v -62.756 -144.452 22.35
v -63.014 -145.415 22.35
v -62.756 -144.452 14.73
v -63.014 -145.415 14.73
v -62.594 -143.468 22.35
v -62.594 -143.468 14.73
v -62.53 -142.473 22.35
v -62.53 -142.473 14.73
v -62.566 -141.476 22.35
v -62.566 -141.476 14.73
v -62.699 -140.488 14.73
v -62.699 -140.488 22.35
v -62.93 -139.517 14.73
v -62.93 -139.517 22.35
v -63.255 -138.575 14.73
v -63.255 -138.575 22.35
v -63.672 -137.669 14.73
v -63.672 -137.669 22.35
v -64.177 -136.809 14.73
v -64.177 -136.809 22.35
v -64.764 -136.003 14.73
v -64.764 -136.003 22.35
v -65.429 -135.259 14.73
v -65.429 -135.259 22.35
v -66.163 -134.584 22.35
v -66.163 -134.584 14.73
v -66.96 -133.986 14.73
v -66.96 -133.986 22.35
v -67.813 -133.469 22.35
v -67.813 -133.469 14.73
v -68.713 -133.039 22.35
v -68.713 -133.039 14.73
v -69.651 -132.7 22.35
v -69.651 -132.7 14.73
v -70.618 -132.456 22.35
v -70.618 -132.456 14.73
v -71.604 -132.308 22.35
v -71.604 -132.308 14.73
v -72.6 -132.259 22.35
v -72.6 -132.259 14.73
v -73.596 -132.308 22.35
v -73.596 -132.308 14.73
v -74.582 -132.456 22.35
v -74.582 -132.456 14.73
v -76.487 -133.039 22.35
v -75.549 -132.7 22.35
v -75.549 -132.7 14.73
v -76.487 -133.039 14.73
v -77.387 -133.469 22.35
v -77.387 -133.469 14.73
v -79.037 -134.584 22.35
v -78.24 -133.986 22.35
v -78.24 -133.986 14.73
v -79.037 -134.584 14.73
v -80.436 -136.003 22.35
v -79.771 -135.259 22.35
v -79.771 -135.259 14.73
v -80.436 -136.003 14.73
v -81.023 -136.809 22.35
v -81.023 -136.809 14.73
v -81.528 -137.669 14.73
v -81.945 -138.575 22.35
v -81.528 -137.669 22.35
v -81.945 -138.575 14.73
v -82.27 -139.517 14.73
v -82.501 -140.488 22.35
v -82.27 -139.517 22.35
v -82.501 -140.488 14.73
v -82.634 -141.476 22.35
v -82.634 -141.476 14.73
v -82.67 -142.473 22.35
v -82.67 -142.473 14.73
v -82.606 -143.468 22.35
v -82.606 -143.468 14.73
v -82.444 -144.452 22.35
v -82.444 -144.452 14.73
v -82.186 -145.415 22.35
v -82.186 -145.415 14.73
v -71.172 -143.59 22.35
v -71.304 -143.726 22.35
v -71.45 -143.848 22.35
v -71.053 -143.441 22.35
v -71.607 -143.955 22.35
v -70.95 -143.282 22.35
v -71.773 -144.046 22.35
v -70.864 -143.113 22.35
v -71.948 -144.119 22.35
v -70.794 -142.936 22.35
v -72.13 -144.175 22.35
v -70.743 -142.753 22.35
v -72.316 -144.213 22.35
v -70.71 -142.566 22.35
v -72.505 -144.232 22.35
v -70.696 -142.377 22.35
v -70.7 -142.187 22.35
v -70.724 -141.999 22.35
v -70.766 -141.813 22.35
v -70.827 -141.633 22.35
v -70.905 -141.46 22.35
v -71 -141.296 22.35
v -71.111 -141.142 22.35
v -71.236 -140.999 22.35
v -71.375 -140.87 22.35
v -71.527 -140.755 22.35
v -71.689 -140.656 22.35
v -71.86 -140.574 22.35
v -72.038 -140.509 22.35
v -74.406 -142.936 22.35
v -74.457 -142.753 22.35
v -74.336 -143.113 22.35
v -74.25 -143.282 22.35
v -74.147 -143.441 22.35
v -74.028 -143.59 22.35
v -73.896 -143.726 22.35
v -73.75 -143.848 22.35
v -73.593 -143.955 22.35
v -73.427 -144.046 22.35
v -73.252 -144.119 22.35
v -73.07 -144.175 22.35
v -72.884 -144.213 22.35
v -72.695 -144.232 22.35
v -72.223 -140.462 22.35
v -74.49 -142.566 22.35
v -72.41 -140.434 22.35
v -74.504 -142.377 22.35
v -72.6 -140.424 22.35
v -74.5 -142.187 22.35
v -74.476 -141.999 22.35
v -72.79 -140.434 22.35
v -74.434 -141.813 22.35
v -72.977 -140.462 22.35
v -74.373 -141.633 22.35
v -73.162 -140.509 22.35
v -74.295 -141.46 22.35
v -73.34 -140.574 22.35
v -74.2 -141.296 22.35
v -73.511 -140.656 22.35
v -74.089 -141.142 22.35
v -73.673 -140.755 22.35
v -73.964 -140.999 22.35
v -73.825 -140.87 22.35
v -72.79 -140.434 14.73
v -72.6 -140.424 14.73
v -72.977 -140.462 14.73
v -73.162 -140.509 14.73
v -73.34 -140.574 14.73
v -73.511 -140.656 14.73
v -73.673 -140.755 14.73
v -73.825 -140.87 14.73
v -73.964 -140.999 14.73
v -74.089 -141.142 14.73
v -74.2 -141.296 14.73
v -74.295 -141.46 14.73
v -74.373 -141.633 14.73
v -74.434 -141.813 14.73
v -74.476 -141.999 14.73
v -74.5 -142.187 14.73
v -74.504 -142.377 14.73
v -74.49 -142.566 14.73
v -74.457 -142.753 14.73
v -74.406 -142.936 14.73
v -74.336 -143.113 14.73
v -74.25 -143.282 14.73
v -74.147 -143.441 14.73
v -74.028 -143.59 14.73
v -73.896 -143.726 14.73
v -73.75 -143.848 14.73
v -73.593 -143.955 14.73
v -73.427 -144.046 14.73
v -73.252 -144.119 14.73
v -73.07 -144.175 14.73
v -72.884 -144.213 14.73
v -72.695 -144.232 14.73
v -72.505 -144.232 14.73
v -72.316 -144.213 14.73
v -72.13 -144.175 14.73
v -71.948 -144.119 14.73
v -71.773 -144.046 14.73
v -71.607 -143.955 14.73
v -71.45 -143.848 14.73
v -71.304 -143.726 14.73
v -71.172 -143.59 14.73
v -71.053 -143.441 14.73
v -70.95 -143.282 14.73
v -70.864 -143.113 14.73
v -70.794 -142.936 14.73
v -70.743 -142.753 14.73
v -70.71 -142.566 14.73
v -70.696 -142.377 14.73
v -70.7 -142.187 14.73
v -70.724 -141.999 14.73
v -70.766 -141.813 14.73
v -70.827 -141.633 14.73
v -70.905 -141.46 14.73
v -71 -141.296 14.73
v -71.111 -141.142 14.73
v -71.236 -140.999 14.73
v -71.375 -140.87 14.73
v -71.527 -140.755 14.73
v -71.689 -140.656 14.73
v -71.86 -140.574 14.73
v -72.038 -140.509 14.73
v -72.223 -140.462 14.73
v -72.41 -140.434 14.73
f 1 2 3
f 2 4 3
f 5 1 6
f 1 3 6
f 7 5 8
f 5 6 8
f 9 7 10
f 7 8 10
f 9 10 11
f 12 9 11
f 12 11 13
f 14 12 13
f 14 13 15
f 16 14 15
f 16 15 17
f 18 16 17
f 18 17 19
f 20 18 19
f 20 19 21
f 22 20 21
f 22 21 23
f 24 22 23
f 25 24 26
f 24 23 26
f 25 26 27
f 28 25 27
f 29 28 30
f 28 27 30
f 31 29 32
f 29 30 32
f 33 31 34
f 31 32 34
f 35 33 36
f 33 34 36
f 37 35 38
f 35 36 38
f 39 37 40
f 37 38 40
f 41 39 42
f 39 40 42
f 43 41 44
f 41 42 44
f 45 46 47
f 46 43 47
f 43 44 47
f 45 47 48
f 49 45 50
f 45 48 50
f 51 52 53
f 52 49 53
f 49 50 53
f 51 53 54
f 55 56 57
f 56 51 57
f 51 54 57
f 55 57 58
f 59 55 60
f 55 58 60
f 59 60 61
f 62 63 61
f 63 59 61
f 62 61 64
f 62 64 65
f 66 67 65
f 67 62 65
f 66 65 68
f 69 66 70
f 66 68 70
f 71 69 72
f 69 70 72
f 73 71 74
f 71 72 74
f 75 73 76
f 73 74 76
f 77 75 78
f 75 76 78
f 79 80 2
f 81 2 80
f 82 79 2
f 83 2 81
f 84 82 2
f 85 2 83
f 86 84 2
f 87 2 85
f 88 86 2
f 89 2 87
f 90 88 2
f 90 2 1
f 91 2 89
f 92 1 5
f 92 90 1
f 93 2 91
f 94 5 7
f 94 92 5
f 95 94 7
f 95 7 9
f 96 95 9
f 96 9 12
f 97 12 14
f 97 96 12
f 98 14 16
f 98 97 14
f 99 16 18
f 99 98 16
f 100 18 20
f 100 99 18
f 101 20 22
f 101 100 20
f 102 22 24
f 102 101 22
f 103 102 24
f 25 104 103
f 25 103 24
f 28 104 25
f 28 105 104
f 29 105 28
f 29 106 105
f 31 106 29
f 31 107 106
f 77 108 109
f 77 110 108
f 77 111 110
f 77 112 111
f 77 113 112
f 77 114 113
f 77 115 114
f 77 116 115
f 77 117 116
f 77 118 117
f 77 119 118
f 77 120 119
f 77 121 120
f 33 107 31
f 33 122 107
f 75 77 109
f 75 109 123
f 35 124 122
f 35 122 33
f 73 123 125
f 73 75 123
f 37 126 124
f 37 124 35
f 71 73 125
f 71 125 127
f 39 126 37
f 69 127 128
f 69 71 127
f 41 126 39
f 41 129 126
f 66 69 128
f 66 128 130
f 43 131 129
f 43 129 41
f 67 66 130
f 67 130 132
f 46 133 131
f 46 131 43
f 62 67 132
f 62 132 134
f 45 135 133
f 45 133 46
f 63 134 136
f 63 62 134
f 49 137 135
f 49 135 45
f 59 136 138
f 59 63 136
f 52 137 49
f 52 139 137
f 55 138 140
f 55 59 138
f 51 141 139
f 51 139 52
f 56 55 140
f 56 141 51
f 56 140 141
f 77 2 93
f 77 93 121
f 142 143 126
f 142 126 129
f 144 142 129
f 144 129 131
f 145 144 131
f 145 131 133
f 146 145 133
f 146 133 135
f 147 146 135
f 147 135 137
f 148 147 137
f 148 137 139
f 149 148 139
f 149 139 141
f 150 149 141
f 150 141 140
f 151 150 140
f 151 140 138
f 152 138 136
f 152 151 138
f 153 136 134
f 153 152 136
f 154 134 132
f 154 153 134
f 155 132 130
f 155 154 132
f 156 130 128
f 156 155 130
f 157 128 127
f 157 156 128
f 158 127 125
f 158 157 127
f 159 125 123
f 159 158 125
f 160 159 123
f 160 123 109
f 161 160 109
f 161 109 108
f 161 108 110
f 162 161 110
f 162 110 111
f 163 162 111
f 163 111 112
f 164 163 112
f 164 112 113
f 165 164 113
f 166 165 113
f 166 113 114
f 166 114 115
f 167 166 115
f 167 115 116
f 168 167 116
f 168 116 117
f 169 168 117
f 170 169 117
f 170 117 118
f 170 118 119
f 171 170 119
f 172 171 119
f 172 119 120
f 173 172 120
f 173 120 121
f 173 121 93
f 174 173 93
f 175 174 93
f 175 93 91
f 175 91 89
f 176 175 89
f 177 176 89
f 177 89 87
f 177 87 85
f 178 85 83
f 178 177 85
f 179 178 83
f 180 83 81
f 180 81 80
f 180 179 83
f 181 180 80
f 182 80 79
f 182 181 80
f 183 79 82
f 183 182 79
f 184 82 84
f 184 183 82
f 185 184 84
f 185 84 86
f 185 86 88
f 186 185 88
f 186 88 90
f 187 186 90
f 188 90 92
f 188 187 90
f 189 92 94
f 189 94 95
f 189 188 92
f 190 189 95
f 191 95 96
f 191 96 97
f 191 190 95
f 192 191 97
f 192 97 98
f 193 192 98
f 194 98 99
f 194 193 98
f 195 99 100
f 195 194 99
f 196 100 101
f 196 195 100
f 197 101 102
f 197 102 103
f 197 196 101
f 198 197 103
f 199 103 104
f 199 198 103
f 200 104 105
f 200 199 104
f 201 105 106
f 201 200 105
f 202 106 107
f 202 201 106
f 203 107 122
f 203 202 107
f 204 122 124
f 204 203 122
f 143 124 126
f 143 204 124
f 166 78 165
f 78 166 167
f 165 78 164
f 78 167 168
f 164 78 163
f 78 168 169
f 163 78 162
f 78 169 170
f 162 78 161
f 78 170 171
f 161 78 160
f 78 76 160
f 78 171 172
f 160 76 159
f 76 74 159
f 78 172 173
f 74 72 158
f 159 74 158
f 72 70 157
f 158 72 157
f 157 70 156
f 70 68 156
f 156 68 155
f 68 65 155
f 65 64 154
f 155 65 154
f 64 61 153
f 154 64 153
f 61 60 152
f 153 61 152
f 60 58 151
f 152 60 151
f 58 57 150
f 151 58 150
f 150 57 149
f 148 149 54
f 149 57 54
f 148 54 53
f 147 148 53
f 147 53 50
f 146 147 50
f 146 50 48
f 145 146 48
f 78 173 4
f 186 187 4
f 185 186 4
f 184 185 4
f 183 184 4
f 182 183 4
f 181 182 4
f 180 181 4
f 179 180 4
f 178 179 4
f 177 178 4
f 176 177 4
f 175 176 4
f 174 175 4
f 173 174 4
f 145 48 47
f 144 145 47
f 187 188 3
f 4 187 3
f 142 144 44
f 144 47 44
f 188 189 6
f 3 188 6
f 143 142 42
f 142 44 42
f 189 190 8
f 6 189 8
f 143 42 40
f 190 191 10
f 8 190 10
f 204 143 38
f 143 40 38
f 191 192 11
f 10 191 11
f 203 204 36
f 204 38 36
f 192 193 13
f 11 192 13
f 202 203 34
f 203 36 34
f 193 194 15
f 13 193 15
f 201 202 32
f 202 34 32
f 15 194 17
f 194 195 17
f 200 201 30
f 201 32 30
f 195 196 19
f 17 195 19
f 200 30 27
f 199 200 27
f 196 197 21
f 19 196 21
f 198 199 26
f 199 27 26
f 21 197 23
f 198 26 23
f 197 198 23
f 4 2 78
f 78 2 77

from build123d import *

# Parameters (mm, degrees)
BOSS_EXTRUDE1_DEPTH      = 6.35
BOSS_EXTRUDE1_DEPTH_BACK = 6.35
SKETCH1_R                = 2.667
SKETCH2_R                = 10.070680165
SKETCH2_R_2              = 1.905
BOSS_EXTRUDE2_DEPTH      = 16
SKETCH4_W                = 19.172603048
SKETCH4_H                = 6.985
CUT_EXTRUDE2_DEPTH       = 7.62
CUT_EXTRUDE3_DEPTH       = 87.58734866
CUT_EXTRUDE3_DEPTH_BACK  = 87.58734866
SKETCH6_W                = 20.14136033
SKETCH6_H                = 21.08


with BuildPart() as part:
    # Sketch1 → Boss-Extrude1 (new, two sides: drawn at the far end of the back side and taken through both)
    with BuildSketch(Plane.XY.offset(-BOSS_EXTRUDE1_DEPTH_BACK)):
        with Locations((-72.6, -136.95)):
            Circle(SKETCH1_R)
    extrude(amount=BOSS_EXTRUDE1_DEPTH + BOSS_EXTRUDE1_DEPTH_BACK)

    # Sketch2 → Boss-Extrude2 (add)
    with BuildSketch(Plane.XY.offset(6.35)):
        with Locations(Location((-72.6, -142.329319835, 0), (0, 0, 90))):
            Circle(SKETCH2_R)
        with Locations(Location((-72.6, -142.329319835, 0), (0, 0, 90))):
            Circle(SKETCH2_R_2, mode=Mode.SUBTRACT)
    extrude(amount=BOSS_EXTRUDE2_DEPTH)

    # Sketch4 → Cut-Extrude2 (cut)
    with BuildSketch(Plane(origin=(0, 0, 22.35), x_dir=(-1, 0, 0), z_dir=(0, 0, -1))):
        with Locations((72.6, -148.9075)):
            Rectangle(SKETCH4_W, SKETCH4_H)
    extrude(amount=CUT_EXTRUDE2_DEPTH, mode=Mode.SUBTRACT)

    # Sketch6 → Cut-Extrude3 (cut, two sides: drawn at the far end of the back side and taken through both)
    with BuildSketch(Plane.XZ.offset(139.617).offset(-CUT_EXTRUDE3_DEPTH_BACK)):
        with Locations((-72.6, 4.19)):
            Rectangle(SKETCH6_W, SKETCH6_H)
    extrude(amount=CUT_EXTRUDE3_DEPTH + CUT_EXTRUDE3_DEPTH_BACK, mode=Mode.SUBTRACT)


solid = part.part
